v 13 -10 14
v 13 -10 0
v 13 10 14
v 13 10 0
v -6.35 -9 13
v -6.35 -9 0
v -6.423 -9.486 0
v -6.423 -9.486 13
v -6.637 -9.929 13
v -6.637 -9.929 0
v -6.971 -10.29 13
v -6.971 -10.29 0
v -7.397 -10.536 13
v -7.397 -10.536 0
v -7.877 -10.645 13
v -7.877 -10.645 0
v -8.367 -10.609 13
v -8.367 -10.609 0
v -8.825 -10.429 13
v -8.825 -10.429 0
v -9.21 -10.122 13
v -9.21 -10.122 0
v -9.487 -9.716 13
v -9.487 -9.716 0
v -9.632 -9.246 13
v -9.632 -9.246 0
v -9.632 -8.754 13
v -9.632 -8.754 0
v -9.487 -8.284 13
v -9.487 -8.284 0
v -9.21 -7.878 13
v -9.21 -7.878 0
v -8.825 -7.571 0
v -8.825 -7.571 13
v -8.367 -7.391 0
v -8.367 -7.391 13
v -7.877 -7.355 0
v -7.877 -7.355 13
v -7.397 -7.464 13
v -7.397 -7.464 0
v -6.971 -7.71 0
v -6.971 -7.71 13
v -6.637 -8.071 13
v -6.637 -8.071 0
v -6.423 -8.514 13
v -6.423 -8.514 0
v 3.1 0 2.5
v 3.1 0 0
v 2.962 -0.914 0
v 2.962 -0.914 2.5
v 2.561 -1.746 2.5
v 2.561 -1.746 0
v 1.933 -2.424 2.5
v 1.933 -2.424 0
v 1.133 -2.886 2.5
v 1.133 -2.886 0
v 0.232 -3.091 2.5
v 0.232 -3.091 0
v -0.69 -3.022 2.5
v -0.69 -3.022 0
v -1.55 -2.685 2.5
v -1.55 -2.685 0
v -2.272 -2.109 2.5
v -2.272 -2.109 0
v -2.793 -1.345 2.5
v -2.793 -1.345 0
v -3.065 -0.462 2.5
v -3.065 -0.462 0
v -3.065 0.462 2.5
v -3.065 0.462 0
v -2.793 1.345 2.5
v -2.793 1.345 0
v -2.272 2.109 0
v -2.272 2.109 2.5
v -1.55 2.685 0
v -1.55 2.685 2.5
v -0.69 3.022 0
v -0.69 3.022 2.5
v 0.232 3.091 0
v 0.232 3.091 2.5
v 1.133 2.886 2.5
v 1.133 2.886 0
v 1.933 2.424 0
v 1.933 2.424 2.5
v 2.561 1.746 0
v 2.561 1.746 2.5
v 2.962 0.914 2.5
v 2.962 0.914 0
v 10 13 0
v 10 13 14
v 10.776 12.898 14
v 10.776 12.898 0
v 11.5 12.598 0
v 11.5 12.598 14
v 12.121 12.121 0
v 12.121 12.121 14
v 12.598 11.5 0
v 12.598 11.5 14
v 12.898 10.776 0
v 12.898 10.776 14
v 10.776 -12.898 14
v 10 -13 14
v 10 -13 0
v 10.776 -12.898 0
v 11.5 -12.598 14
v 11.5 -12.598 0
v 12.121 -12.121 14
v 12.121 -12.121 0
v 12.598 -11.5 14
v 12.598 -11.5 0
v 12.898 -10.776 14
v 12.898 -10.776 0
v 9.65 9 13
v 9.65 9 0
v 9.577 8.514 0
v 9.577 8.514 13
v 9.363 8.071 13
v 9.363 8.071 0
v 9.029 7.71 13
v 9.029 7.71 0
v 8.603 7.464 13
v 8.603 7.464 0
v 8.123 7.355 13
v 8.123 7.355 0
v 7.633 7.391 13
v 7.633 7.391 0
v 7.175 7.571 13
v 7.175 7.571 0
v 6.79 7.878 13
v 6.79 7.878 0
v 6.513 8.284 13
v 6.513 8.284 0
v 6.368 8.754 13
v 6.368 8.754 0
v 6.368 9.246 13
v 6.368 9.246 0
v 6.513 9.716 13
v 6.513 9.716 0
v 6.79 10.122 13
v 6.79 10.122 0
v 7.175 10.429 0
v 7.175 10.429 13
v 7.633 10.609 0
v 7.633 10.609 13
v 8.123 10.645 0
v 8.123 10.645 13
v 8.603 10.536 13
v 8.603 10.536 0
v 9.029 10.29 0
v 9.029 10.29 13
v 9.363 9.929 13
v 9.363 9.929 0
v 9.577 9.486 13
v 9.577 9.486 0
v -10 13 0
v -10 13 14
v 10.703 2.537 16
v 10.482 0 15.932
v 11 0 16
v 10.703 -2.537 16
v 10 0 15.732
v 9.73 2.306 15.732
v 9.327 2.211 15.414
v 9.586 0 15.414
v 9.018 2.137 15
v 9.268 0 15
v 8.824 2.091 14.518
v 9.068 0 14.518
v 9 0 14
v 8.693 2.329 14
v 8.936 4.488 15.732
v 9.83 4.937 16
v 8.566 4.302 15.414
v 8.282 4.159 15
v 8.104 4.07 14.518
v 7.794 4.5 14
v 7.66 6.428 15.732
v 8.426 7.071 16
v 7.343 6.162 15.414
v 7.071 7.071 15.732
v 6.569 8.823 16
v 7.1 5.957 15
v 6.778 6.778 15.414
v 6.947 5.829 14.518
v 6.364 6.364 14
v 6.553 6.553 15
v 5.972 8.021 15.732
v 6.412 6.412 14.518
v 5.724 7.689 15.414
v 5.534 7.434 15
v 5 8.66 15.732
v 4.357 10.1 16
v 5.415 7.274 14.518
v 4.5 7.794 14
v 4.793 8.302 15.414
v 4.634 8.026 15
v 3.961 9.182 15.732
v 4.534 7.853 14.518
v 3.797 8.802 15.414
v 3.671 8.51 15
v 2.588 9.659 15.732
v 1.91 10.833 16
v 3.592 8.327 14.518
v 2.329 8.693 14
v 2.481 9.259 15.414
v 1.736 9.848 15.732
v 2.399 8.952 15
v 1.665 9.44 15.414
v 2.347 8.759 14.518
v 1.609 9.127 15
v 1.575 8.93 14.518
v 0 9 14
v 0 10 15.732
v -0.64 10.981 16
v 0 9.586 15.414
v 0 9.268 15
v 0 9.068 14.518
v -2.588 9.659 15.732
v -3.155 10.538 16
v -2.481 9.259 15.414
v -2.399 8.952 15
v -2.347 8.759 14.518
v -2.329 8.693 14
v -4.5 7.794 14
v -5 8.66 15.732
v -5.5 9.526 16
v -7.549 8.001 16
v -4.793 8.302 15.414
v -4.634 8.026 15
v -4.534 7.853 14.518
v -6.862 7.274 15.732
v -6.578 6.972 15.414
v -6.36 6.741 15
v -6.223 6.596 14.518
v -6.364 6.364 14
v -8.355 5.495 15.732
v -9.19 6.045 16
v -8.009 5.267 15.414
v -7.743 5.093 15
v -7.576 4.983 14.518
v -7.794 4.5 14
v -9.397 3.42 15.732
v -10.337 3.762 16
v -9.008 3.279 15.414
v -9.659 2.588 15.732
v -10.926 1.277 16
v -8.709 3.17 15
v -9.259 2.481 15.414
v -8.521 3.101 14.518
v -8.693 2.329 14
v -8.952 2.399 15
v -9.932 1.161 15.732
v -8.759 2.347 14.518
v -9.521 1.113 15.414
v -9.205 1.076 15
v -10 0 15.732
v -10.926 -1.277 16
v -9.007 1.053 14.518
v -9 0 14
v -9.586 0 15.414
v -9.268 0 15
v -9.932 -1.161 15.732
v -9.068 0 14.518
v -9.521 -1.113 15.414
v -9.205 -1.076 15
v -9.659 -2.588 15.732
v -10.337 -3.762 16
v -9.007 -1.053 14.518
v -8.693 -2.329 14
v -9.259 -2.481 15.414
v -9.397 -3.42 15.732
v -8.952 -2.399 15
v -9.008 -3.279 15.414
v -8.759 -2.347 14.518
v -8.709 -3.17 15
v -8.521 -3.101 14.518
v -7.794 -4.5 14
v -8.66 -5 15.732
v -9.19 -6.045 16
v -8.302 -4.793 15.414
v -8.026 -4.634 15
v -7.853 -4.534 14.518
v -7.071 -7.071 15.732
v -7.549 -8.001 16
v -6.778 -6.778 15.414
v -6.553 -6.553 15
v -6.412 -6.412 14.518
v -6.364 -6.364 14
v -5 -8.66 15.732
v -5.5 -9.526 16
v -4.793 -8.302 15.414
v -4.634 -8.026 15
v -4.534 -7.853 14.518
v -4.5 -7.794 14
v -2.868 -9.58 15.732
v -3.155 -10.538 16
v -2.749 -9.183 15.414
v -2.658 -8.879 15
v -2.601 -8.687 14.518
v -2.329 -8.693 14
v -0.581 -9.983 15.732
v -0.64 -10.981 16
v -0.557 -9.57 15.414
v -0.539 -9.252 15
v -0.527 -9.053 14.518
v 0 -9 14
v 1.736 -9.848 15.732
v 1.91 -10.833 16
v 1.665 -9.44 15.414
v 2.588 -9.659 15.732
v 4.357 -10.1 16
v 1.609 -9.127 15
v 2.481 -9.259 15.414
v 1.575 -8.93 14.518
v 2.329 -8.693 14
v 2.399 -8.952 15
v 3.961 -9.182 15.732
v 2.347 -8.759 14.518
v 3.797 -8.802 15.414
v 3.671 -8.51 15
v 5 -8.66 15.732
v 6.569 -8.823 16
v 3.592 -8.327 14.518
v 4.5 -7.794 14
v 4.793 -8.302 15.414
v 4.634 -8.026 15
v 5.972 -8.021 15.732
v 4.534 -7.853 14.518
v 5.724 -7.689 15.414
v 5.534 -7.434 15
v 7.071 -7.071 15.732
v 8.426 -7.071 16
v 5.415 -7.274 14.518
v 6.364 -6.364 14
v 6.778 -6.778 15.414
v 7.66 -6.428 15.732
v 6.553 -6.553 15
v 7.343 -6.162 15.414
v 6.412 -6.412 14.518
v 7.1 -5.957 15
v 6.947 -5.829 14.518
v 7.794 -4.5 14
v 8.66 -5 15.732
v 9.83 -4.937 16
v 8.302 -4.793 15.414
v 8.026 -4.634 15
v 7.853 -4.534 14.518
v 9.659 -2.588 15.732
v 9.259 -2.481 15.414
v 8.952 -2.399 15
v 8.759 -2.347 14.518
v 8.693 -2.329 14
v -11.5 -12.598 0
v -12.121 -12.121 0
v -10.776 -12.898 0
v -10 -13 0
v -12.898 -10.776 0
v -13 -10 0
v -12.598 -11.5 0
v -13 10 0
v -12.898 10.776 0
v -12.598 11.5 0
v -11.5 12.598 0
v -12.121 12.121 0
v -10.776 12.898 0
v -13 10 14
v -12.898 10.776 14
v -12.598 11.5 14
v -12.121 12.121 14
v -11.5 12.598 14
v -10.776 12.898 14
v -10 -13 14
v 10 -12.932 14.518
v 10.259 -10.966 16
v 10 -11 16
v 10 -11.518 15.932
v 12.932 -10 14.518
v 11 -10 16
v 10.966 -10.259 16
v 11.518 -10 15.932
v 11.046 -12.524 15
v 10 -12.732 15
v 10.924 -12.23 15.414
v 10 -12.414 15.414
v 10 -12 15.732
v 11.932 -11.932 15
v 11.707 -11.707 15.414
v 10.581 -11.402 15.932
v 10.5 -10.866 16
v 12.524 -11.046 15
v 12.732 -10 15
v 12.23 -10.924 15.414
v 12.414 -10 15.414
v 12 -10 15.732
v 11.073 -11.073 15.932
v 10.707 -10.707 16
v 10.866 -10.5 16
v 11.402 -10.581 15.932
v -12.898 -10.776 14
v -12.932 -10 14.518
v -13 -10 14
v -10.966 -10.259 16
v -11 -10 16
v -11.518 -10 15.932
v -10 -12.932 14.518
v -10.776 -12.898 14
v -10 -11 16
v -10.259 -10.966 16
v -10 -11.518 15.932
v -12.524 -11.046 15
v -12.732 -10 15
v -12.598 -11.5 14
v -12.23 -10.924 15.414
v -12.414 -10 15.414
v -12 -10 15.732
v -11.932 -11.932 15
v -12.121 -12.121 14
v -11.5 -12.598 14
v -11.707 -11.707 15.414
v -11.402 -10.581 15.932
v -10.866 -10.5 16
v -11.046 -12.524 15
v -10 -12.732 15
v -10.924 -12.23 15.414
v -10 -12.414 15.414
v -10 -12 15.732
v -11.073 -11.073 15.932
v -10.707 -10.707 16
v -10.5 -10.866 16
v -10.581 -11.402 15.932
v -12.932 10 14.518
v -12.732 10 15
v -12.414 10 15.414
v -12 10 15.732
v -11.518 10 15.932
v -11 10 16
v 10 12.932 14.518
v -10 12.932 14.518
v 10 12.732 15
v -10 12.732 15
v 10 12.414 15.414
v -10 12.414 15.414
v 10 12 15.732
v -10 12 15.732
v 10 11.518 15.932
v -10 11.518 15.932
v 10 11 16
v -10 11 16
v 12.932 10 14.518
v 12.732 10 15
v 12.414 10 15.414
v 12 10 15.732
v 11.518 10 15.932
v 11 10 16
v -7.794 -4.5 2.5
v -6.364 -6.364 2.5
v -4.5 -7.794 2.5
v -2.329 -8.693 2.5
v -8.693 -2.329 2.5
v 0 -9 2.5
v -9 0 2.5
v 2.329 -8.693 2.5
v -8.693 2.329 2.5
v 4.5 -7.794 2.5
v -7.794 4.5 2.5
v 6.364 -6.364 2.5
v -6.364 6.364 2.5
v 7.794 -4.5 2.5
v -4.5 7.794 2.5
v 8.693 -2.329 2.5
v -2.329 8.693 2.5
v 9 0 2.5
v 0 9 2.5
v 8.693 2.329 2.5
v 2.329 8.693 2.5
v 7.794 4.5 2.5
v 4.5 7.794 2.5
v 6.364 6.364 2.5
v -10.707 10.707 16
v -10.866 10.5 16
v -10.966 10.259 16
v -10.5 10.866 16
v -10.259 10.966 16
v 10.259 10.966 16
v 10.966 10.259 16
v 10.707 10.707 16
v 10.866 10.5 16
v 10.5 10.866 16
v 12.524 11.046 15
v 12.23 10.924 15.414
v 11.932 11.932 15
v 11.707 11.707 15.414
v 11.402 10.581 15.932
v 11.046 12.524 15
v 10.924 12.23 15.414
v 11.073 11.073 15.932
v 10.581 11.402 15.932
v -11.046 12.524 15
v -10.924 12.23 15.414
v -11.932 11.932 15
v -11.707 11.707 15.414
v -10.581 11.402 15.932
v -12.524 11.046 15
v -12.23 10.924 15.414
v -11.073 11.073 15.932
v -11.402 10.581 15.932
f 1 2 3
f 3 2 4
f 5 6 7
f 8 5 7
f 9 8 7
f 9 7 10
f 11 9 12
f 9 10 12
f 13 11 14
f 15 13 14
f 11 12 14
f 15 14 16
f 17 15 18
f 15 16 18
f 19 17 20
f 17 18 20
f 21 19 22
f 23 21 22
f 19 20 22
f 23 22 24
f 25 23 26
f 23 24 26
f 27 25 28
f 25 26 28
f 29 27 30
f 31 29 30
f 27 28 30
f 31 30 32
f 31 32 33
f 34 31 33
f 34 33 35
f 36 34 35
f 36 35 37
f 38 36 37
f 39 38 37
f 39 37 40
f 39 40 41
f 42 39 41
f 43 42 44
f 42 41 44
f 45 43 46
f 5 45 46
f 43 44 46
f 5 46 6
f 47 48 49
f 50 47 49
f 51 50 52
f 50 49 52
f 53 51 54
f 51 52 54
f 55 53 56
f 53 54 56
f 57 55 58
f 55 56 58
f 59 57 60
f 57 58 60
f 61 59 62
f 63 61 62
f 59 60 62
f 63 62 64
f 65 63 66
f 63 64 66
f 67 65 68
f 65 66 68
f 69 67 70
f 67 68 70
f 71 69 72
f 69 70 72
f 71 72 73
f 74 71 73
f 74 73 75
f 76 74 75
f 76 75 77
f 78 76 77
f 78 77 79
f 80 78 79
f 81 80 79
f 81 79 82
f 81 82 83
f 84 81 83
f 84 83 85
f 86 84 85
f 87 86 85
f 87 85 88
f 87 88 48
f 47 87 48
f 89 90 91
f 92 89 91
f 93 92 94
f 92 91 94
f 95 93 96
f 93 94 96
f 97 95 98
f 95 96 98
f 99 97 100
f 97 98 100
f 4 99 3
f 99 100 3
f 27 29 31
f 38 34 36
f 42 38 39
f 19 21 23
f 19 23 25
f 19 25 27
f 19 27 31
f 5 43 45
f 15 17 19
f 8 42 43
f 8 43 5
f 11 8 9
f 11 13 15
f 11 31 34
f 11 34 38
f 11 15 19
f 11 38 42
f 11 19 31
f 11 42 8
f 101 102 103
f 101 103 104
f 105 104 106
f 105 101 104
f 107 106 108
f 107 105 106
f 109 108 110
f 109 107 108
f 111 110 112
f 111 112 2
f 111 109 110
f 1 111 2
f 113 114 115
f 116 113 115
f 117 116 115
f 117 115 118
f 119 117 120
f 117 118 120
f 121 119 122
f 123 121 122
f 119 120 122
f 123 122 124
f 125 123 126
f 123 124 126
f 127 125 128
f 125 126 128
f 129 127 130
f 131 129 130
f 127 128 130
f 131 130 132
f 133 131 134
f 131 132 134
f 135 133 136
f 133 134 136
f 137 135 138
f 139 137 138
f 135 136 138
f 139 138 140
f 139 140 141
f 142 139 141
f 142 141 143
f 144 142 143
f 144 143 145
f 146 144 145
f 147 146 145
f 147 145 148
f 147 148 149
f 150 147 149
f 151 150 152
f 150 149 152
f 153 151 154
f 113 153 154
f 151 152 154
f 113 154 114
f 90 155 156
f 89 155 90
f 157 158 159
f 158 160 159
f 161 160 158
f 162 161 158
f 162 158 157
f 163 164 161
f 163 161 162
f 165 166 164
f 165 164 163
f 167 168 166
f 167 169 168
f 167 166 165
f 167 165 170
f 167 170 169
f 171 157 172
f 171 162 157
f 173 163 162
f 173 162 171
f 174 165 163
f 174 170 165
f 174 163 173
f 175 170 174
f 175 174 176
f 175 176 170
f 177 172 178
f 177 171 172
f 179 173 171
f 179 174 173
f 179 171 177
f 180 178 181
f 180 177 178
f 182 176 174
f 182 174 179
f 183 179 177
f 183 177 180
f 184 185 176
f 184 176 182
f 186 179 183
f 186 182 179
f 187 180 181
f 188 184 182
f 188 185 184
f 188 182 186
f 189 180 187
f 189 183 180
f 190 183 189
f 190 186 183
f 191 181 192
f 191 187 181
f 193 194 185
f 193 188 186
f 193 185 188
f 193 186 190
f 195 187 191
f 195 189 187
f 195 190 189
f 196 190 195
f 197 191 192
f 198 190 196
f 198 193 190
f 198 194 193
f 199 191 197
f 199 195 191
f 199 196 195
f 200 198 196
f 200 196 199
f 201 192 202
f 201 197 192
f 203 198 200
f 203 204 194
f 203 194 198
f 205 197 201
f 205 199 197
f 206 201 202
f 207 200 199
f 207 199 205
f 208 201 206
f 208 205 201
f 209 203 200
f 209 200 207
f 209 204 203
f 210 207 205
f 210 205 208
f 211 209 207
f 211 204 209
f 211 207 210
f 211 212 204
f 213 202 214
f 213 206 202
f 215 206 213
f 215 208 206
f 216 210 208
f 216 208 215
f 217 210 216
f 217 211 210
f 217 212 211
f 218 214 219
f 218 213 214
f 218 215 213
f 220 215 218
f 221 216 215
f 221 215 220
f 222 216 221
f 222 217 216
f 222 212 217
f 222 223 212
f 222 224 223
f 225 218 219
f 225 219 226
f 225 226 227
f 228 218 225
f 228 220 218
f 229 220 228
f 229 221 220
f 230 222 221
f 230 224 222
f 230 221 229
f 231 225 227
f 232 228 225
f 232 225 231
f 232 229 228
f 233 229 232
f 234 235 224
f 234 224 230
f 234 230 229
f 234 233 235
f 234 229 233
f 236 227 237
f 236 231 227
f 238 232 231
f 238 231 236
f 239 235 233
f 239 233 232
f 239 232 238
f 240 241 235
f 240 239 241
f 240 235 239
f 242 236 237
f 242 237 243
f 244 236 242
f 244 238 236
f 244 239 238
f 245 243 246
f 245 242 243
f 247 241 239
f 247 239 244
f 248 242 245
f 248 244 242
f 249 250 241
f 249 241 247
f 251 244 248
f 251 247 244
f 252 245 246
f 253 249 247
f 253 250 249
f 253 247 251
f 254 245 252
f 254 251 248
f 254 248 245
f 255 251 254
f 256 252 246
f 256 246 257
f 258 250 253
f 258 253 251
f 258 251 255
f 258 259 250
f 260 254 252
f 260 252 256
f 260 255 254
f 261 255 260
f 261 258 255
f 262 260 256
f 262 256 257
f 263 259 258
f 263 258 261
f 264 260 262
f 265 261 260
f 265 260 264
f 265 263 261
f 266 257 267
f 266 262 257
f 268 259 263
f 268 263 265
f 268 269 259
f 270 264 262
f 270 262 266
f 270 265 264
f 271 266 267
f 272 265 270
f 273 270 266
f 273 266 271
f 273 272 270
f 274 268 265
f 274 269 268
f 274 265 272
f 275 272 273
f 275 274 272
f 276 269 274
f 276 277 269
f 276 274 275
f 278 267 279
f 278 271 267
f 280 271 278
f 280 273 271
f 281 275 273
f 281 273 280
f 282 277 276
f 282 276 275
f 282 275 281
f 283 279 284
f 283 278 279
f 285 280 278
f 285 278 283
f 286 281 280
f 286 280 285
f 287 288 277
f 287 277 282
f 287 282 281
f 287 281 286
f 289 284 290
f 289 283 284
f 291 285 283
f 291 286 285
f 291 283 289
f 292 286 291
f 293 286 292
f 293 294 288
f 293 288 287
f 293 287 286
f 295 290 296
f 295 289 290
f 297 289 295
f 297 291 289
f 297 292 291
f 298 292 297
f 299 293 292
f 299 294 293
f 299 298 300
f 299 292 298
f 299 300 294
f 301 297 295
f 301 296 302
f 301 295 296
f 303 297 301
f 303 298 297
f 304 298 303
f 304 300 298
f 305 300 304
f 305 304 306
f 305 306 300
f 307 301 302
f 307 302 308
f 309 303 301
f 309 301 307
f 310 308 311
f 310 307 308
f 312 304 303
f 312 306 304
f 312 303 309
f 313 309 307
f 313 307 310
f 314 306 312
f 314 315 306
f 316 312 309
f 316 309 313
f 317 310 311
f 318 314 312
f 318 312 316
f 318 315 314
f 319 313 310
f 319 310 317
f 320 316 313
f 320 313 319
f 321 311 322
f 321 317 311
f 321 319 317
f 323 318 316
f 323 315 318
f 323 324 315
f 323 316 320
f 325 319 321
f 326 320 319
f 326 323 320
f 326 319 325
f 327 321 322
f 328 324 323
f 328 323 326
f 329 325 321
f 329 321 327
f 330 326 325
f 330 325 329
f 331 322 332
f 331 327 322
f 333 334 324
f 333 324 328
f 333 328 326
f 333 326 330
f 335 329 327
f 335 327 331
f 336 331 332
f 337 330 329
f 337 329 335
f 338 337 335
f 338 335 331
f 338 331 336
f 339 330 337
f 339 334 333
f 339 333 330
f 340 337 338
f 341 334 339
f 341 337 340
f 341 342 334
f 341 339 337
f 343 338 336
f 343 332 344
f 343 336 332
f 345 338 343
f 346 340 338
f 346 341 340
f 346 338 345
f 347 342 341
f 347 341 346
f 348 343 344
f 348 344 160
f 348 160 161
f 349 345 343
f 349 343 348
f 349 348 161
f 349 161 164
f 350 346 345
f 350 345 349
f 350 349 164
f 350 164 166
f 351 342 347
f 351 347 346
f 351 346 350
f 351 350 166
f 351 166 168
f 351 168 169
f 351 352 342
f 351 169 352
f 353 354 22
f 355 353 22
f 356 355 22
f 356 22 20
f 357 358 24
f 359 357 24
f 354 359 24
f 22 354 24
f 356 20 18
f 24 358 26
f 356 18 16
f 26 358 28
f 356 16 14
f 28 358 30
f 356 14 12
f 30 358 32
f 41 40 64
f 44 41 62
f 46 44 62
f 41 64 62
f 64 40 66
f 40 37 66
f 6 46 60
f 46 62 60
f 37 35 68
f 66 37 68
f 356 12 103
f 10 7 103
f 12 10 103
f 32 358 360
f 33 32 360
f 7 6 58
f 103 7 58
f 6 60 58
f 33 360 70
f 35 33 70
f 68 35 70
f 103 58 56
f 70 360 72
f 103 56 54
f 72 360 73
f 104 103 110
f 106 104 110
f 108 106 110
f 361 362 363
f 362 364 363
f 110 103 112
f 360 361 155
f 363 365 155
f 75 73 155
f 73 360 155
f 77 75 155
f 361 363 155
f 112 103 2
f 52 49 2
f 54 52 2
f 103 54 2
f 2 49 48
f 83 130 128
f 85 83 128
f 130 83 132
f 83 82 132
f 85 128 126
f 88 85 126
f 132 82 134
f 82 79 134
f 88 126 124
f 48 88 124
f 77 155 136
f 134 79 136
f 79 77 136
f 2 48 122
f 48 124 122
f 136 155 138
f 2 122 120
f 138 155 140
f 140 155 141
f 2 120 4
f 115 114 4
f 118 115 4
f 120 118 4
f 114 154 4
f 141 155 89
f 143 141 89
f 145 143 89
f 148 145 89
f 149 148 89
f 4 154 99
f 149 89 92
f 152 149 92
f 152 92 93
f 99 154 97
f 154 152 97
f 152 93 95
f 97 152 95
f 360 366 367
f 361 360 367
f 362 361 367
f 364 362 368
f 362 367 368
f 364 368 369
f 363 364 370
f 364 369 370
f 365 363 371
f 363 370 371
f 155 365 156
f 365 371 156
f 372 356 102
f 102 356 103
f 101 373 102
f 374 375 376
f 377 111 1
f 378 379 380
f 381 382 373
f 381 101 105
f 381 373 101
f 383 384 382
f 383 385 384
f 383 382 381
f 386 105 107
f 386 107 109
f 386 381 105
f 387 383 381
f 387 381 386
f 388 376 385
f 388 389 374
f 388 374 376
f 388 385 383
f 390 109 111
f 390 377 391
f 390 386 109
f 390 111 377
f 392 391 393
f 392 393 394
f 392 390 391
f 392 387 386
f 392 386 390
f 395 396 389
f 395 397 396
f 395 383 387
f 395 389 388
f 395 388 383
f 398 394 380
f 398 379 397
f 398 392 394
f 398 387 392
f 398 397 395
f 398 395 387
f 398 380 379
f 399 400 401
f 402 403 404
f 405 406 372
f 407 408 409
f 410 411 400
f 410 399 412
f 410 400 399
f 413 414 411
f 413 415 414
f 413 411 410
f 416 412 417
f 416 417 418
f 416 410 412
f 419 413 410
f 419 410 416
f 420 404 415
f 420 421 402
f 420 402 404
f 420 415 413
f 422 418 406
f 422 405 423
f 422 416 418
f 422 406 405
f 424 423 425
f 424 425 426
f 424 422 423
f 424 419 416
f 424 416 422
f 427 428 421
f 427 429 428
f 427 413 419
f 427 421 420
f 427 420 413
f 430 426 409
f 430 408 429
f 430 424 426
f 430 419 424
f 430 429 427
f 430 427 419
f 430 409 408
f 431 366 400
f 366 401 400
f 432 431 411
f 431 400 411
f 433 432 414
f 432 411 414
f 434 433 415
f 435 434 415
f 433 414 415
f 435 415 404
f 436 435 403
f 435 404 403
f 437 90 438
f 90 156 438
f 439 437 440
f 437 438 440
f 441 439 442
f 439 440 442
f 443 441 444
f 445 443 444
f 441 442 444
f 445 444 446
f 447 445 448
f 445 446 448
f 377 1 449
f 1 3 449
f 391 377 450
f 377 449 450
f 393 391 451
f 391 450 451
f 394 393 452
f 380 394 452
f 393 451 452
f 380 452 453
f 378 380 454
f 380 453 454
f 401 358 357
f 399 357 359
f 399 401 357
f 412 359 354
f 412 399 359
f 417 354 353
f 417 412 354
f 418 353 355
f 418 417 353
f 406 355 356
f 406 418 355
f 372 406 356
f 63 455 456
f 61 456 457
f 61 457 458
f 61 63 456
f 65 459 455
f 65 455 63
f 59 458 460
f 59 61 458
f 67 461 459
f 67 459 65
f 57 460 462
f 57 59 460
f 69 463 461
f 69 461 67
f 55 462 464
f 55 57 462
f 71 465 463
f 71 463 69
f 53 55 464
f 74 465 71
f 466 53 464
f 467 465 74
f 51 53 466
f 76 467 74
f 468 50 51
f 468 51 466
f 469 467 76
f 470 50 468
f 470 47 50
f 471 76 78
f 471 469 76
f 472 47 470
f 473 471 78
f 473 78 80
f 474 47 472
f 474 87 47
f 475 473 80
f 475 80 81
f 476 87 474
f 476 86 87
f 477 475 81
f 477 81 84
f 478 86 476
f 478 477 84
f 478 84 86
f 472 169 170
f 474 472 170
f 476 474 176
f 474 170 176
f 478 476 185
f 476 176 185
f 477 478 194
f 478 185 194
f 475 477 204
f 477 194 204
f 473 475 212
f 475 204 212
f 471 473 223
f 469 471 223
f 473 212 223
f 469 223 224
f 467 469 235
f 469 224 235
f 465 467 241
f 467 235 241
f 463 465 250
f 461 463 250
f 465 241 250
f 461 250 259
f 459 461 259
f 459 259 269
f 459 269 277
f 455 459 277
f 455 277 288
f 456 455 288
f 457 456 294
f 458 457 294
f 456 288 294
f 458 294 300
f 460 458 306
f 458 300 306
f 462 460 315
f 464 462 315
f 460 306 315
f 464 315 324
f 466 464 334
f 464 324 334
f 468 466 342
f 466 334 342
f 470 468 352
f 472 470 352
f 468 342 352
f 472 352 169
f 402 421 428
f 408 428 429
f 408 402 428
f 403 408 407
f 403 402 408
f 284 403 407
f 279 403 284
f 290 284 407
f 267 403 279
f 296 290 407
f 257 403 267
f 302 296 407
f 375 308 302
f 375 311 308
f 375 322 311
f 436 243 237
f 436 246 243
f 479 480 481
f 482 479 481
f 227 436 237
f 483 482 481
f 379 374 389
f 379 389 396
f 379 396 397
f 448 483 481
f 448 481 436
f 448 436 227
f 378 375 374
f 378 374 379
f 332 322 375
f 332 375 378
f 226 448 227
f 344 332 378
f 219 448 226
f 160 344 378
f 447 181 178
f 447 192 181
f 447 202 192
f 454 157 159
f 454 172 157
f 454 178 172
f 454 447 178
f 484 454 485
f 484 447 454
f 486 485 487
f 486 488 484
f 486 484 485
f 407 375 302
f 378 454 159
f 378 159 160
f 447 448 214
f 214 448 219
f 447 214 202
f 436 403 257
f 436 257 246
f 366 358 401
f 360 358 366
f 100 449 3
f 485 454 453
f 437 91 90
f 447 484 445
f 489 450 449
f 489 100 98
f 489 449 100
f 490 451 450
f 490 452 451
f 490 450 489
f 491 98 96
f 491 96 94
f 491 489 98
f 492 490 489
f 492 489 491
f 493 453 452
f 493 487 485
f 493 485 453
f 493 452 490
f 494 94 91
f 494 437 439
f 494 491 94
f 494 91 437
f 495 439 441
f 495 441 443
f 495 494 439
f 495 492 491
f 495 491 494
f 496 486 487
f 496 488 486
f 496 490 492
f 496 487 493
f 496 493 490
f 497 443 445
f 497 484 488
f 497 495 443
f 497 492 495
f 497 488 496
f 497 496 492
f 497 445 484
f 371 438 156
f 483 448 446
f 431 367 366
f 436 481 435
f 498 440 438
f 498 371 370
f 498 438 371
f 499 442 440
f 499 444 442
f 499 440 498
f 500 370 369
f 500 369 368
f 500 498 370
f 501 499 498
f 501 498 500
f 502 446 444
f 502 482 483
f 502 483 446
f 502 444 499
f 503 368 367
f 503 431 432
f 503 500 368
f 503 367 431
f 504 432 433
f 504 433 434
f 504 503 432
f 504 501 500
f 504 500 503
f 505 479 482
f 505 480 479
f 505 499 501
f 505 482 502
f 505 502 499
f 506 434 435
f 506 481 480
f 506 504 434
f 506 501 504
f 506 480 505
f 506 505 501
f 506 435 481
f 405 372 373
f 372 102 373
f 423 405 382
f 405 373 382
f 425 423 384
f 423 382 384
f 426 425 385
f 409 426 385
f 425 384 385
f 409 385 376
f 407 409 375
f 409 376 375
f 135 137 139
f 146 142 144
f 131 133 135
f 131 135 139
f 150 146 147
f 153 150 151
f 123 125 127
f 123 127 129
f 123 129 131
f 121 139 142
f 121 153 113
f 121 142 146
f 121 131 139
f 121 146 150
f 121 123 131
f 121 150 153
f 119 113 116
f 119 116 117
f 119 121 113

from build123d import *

# Parameters (mm, degrees)
F0_W     = 26
F0_H     = 26
F1_DEPTH = 16
F2_R     = 9
F3_DEPTH = 13.5
F4_R     = 1.65
F4_R_2   = 3.1
F5_DEPTH = 13
F6_R     = 3
F7_R     = 1.99999


# Not quite as in the source:
# - a fillet or chamfer is up to 0.001 mm smaller than in the source, because OpenCascade refuses the exact size


with BuildPart() as f1:
    # F0 (on Top) → F1 (new body)
    with BuildSketch(Plane.XY):
        Rectangle(F0_W, F0_H)
    extrude(amount=F1_DEPTH)

    # F2 (on face) → F3 (cut)
    with BuildSketch(Plane.XY.offset(16)):
        Circle(F2_R)
    extrude(amount=-F3_DEPTH, mode=Mode.SUBTRACT)

    # F4 (on face) → F5 (cut)
    with BuildSketch(Plane(origin=(0, 0, 0), x_dir=(1, 0, 0), z_dir=(0, 0, -1))):
        with Locations((8, -9)):
            Circle(F4_R)
        Circle(F4_R_2)
        with Locations((-8, 9)):
            Circle(F4_R)
    extrude(amount=-F5_DEPTH, mode=Mode.SUBTRACT)

    # F6
    f6_edges = [f1.edges().sort_by_distance(p)[0] for p in [
        (-13, 13, 8),
        (13, 13, 8),
        (-13, -13, 8),
        (13, -13, 8),
    ]]
    fillet(f6_edges, radius=F6_R)

    # F7 (radius 2 in the source; OpenCascade refuses exactly that, so slightly less here)
    f7_edges = [f1.edges().sort_by_distance(p)[0] for p in [
        (-12.12132, -12.12132, 16),
        (-13, 0, 16),
        (-12.12132, 12.12132, 16),
        (0, 13, 16),
        (12.12132, 12.12132, 16),
        (13, 0, 16),
        (12.12132, -12.12132, 16),
        (0, -13, 16),
        (-9, 0, 16),
    ]]
    fillet(f7_edges, radius=F7_R)


solid = f1.part
